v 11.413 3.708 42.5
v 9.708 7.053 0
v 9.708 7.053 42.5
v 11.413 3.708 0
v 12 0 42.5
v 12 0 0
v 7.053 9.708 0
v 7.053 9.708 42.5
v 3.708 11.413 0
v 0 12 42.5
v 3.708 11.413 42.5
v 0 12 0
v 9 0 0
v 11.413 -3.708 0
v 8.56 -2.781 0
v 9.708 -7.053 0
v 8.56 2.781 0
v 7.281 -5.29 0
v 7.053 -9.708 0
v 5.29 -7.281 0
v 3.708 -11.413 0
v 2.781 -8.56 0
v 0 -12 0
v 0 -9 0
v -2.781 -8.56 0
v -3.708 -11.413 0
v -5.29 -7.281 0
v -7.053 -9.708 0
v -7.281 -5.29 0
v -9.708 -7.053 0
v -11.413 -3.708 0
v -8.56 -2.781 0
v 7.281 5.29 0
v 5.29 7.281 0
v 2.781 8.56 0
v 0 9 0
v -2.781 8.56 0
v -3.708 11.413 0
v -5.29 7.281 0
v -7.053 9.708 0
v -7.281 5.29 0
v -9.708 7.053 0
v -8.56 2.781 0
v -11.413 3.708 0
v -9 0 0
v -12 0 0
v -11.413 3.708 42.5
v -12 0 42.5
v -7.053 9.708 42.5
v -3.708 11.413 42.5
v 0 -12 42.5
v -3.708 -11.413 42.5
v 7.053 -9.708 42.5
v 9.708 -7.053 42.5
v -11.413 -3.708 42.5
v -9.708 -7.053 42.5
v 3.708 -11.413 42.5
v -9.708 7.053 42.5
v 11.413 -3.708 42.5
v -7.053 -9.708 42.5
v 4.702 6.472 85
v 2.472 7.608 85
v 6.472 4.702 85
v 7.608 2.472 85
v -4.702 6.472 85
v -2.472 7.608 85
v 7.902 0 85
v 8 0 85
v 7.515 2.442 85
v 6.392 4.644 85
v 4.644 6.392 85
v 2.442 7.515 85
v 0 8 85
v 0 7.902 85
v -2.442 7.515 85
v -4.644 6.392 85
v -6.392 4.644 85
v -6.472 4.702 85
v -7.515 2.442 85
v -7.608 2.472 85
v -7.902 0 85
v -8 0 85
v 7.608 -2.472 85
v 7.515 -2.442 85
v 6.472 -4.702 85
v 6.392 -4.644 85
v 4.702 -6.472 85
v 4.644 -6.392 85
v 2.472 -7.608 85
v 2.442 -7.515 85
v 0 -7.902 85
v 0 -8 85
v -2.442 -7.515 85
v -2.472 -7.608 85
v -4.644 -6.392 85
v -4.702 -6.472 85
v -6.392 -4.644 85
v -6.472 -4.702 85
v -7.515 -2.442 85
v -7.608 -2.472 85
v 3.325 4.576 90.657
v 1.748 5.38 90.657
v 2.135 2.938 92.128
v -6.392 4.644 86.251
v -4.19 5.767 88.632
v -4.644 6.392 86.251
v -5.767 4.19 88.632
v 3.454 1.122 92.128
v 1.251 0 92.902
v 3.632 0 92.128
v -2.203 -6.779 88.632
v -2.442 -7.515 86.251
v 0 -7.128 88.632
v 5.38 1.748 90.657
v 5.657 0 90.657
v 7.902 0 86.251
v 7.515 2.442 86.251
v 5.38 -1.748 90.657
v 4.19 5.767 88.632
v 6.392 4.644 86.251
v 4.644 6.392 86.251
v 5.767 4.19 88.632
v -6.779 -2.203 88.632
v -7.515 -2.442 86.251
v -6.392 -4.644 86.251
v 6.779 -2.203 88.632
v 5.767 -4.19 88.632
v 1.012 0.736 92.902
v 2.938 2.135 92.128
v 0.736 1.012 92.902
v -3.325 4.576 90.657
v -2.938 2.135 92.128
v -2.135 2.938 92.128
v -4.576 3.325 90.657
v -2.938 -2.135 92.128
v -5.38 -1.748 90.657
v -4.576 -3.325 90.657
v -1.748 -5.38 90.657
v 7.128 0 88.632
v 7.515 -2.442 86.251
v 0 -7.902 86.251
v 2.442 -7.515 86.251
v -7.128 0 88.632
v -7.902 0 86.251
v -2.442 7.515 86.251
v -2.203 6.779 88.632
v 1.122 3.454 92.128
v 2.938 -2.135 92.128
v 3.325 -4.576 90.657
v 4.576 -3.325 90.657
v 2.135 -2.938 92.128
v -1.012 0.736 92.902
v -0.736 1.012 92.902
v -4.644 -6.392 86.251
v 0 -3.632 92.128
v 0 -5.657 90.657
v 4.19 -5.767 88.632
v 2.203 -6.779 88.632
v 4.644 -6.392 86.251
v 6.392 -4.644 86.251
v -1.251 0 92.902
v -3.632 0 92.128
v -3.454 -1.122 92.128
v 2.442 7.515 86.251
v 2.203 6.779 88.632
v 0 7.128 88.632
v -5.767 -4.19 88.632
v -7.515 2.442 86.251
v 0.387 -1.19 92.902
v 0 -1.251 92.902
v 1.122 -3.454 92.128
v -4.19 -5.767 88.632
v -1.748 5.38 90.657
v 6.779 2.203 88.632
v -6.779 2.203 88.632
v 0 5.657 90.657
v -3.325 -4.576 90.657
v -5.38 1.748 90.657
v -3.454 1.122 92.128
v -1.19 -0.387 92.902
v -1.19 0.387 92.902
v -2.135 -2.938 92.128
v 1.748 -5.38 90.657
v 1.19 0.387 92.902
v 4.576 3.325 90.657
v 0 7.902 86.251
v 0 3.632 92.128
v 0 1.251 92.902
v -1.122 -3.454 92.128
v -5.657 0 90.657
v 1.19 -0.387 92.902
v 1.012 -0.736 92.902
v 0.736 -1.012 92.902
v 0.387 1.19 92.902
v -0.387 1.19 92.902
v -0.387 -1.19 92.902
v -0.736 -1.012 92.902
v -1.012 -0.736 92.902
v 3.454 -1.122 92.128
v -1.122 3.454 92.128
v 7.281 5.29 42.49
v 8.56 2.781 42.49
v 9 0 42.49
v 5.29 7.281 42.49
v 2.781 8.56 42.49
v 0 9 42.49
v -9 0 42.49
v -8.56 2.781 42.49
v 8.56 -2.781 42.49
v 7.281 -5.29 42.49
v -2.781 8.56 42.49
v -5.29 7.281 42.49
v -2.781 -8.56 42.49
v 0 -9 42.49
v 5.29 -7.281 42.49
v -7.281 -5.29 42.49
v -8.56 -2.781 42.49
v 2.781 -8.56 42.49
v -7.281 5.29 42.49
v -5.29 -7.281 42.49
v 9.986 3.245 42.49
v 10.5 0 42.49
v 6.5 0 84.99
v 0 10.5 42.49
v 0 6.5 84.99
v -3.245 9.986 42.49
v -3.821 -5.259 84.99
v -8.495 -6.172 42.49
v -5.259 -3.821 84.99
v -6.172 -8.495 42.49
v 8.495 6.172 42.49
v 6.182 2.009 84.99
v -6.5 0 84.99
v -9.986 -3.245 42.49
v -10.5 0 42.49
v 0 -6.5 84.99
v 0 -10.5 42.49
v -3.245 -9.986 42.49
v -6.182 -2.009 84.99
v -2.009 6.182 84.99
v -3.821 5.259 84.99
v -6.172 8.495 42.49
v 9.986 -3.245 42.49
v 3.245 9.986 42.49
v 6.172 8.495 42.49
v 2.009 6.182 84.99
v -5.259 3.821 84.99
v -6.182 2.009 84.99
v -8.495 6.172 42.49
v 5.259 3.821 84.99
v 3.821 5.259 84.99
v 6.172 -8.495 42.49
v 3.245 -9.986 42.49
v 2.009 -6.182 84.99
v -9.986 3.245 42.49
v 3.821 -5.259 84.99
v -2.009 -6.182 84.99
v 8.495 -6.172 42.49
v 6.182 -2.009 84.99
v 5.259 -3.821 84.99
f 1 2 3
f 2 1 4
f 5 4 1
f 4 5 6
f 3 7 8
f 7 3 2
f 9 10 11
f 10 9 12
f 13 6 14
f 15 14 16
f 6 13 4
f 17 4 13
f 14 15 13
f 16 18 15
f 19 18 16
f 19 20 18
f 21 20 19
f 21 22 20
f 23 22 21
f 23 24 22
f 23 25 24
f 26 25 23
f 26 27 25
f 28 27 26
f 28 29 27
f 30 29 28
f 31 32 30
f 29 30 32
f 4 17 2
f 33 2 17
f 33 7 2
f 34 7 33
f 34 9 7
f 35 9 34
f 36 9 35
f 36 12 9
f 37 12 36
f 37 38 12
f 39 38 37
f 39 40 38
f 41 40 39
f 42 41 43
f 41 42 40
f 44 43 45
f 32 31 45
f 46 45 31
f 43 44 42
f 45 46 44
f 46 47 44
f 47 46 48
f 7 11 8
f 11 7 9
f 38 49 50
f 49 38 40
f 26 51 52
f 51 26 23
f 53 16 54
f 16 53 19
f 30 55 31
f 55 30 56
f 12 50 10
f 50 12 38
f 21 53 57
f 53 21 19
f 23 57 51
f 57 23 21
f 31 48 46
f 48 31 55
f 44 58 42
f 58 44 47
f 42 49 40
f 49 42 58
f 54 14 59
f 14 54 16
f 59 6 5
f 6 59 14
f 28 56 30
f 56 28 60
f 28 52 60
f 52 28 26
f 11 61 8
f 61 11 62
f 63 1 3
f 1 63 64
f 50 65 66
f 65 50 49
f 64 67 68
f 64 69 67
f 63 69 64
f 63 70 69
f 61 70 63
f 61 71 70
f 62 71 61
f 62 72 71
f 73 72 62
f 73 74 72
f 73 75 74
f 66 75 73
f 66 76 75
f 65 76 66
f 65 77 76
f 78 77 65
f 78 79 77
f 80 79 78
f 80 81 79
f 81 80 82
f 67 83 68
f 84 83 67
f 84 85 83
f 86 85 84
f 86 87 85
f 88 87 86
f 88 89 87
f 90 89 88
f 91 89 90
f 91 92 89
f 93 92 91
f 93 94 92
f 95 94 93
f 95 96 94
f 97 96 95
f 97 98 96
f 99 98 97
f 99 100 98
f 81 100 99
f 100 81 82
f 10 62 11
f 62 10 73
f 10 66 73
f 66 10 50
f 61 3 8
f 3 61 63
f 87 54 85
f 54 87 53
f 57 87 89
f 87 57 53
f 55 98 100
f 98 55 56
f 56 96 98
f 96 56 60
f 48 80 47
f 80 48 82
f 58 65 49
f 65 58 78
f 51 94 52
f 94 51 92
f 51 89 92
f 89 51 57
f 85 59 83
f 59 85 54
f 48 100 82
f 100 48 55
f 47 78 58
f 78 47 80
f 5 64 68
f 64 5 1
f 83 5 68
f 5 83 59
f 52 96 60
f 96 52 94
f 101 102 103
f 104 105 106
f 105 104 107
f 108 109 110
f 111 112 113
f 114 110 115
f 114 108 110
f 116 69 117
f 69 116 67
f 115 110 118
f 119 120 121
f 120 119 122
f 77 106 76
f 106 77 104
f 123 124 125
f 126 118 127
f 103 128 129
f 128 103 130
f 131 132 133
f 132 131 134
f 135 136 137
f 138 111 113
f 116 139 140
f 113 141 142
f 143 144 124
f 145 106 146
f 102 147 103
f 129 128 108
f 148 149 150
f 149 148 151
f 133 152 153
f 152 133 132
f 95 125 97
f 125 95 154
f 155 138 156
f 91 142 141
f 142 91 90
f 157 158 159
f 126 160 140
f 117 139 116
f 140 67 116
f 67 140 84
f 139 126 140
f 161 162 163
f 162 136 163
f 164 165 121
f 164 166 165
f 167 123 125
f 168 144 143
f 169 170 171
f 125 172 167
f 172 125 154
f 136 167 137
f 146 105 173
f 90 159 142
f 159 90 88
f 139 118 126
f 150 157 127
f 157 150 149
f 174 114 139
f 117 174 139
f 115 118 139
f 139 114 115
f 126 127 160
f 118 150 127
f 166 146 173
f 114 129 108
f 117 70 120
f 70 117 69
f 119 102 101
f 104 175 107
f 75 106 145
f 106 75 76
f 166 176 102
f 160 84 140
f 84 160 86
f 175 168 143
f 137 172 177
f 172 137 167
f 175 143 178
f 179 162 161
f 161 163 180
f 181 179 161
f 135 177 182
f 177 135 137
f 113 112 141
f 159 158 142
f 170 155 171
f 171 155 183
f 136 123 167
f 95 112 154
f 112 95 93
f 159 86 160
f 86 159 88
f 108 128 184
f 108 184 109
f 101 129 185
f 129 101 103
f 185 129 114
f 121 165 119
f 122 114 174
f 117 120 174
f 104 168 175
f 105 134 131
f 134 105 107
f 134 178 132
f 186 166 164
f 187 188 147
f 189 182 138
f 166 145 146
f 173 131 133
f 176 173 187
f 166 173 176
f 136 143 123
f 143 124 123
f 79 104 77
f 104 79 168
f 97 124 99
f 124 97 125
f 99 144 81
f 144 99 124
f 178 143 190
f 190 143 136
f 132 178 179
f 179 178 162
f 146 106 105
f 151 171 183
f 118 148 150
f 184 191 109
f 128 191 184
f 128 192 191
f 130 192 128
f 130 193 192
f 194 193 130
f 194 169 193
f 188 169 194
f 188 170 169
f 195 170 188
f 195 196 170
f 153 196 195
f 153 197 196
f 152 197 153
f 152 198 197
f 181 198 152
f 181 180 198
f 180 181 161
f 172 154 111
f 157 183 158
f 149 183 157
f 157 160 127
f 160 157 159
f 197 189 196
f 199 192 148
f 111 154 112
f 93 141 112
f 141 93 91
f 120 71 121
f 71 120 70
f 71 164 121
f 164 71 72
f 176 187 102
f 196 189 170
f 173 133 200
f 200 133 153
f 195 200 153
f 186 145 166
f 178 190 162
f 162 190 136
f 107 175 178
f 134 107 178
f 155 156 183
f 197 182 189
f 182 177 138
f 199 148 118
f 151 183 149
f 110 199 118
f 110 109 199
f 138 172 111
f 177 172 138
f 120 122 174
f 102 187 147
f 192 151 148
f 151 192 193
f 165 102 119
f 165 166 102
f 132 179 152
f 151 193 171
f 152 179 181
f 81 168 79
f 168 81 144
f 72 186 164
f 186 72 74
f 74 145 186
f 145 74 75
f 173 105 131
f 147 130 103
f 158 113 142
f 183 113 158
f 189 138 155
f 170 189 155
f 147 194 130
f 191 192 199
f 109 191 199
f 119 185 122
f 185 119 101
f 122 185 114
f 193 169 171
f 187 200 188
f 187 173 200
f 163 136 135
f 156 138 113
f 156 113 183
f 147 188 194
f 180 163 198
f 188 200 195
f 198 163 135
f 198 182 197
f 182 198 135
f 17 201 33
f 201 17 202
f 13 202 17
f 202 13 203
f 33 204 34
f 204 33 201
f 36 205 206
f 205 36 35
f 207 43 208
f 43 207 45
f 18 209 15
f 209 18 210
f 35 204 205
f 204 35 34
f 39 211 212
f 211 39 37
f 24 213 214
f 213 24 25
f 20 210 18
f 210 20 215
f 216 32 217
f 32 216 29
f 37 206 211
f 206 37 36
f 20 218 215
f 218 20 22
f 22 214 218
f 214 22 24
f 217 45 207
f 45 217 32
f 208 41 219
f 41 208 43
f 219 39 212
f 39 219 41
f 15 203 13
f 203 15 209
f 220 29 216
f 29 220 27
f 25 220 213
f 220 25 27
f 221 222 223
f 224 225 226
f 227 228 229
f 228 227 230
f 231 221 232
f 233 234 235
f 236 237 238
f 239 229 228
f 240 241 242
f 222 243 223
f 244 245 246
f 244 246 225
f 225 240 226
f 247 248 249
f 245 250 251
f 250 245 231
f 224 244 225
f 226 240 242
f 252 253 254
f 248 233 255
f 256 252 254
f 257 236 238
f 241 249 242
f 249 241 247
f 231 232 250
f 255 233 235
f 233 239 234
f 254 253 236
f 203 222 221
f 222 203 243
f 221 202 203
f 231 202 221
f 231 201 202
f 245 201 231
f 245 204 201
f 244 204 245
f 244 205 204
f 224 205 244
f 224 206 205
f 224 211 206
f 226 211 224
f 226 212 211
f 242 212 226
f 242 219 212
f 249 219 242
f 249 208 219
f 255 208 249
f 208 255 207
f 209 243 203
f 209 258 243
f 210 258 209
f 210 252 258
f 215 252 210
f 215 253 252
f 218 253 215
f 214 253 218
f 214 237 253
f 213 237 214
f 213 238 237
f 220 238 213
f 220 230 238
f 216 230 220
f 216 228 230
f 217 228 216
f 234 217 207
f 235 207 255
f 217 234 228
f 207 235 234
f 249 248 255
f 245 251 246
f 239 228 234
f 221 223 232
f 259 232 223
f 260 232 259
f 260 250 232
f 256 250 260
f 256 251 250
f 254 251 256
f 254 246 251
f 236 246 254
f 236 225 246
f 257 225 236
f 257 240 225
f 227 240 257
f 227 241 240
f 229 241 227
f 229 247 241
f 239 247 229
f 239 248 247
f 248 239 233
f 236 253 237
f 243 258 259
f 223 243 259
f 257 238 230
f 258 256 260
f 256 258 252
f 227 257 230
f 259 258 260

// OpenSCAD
// ***************************************************************
// * Southeastcon 2107
// *
// * Designs of the 3D printed pieces needed for Stage 2 of 
// *   the hardware robotics competition. This file contains 
// *   the lightsaber and the electromagnet coil spool.
// *
// * For more details about the competition go to
// *    http://sites.ieee.org/southeastcon2017
// *
// * Designed by Rodney Radford
// ***************************************************************


// This value controls the accuracy of the cylinders and spheres
// For fast drawing (while making changes), choose a low value (20)
// For more accurate/smoother surfaces, choose a higher value (200)
// The higher value increases computation/drawing time
$fn=20;

// ***************************************************************
// Drawing parameters
// ***************************************************************
fudge = 0.01;

hilt_length = 90;
hilt_radius = 15;
tenon_radius = 9;
tenon_length = 10;

saber_length = 85;
saber_major_radius = 12;
saber_minor_radius = 8;
saber_wall_thickness = 1.5;
inside_radius = 7;

neopixel_zoffset = 15;
neopixel_length  = 50;
neopixel_width   = 6;

bracket_thickness = 6;
screw_radius = 3;

flange_radius = 15;
flange_thickness = 2;
spool_radius = 25.4/4;
spool_width = 25;

hole_radius = 4;
inner_radius = (spool_radius + hole_radius) / 2;
clearance = 0.1;
wire_radius = 1.5;

// ***************************************************************
//
// ***************************************************************

// Look at the source for the 'draw' fun1ction to see what values can 
//   be passed in to it to control rendering parts of the model at a 
//   time for review and/or printing

//draw("innersupport");
//draw("everything");
//draw("bracket+hilt");
draw("blade");

module draw(what) {

   // Draw EVERYTHING - depending on your 3D printer, this mode is not recommended
   //    for a couple of reasons. First, it does not allow the hilt and blade to be
   //    printed in different colors (unless you pause the print and switch). Second,
   //    and most important, is the printer may try to bridge the two parts together,
   //    either intentionally or uninentionally with lots of small strands between the
   //    saber and the spool.
   // But this mode is cool to see all the parts at one time... ;-)
   if (what == "everything") {
      bracket();
      translate([0,0,bracket_thickness]) {
        lightsaber_hilt();
        translate([0,0,hilt_length]) {
           lightsaber_blade(window="true");
           lightsaber_innersupport();
        }
     }

      translate([0,hilt_radius*5,0]) {
         spool_inner();
         translate([0,0,spool_width+flange_thickness]) mirror(v=[0,0,1])
            spool_outer();
      }

   // Just render the hilt - great for 3D printing just this piece out
   // The 'official' hilt will be printed with PLA black, and then painted
   //    silver and gold colors. 
   } else if (what == "hilt") {
        lightsaber_hilt();   

   // Just render the blade - also great for 3D printing just this piece out
   // The official blade will be printed in PLA white.
   } else if (what == "blade") {
      lightsaber_blade();
  //    lightsaber_blade(cutaway="true");
  //    lightsaber_blade(window="true", cutaway="false");

   // Just the bracket
   } else if (what == "bracket") {
      bracket(cutaway="true");
   
   } else if (what == "innersupport") {
      lightsaber_innersupport();

   // bracket and hilt so it can be attached to the stage 2 wall
   } else if (what == "bracket+hilt") {
      bracket();
      translate([0,0,bracket_thickness])
        lightsaber_hilt();

   // Hilt and blade - not really useful for the contest as they need to
   //   be mounted to something, but a) cool to see it together, and b) it
   //   would be fun to see this used as the offensive weapon on the robot
   //   (is anyone up to that challenge?)
   } else if (what == "hilt+blade") {
        lightsaber_hilt();
        translate([0,0,hilt_length])
           lightsaber_blade();

   // Render it all together for visual inspection
   } else if (what == "saber") {
      bracket();
      translate([0,0,bracket_thickness]) {
        lightsaber_hilt();
        translate([0,0,hilt_length])
           lightsaber_blade(cutaway="true");
      }

   // Render just the inner spool for 3D printing (PLA, color not important)
   } else if (what == "spool_inner") {
      spool_inner();

   // Render just the outer spool for 3D printing (PLA, color not important)
   } else if (what == "spool_outer") {
      spool_outer();

   // Render both halves of the spool to verify fit
   } else if (what == "spool") {
      spool_inner();
      translate([0,0,spool_width+flange_thickness]) mirror(v=[0,0,1])
         spool_outer();
   }
}


// ***************************************************************
// 
// ***************************************************************

module lightsaber_hilt() {

difference() {

   union() {

      // major cylinder of the hilt
      color("black") cylinder(r=hilt_radius, h=hilt_length);
      translate([0,0,5])
         color("silver") cylinder(r=hilt_radius+fudge, h=55);

      // add the blade tenon on top
      color("red") translate([0,0,hilt_length])
         cylinder(r=tenon_radius, h=tenon_length);
   }

   // hollow out the center for wires
   translate([0,0,-fudge])
      cylinder(r=inside_radius, h=hilt_length+tenon_length+2*fudge);

   // remove the cylindrical grooves in the lower part of the hilt
   translate([0,0,12])
      for (i = [0:12]) {
         rotate(i*30)
         translate([0,hilt_radius-0.5,0])
         color("black") cylinder(r=3,h=40);
      }
}

// draw the three bands around the hilt
color("gold") for (z = [5,60,86]) {
 translate([0, 0, z]) 
    rotate_extrude(convexity = 10)
       translate([hilt_radius, 0, 0])
       circle(r = 3);
}

// add the square grooves at the upper part of the hilt
translate([0,0,(60+86)/2]) {
   for (i = [0:12]) {
      rotate(i*30)
      translate([0,hilt_radius,0])
        color("silver") cube([4,4,15], center=true);
      }
   }

// draw the button in the center of the upper part of the hilt
translate([0,0,(60+86)/2]) {
   rotate(a=90,v=[0,1,0]) {
      translate([0,0,inside_radius+2])
      color("silver") cylinder(r=5, h=8);
      translate([0,0,inside_radius+2+8])
      color("gold") sphere(r=4);
      }
   }
}


// ***************************************************************
// 
// ***************************************************************

module lightsaber_blade(window="false", cutaway="false") {

   color("white") difference() {
      union() {

         // straight part at the bottom half
         cylinder(r=saber_major_radius, h=saber_length/2);

         // followed by tapered top half
         translate([0,0,saber_length/2])
            cylinder(r1=saber_major_radius, r2=saber_minor_radius, h=saber_length/2);

         // then add the rounded top
         translate([0,0,saber_length]) 
            sphere(r=saber_minor_radius);   
      }

      // add straight walls to fit around the hilt tenon
      translate([0,0,-fudge]) 
         cylinder(r=tenon_radius, h=tenon_length+2*fudge);

      // hollow out the  bottom half of the saber
      translate([0,0,tenon_length]) 
         cylinder(r=tenon_radius, h=saber_length/2 - tenon_length);

      // hollow out the top half of the saber
      translate([0,0,saber_length/2 - fudge])
         cylinder(r1=saber_major_radius-saber_wall_thickness, 
                  r2=saber_minor_radius-saber_wall_thickness, 
                  h=saber_length/2);

      // the "window" option allows printing with non-clear PVA and
      //    opens up a small window in the blade so you can see the LEDs
      if (window == "true") {
          translate([0,-neopixel_width*.55,neopixel_zoffset])
             cube([saber_major_radius+fudge*2, 
                   neopixel_width*1.1, 
                   neopixel_length]);
      }  

      // the cutaway option allows seeing the interior of the blade
      if (cutaway == "true") {
         rotate(-90) translate([0,-saber_major_radius-fudge,-fudge])
            cube([saber_major_radius+  + 2*fudge, 
                  saber_major_radius*2 + 2*fudge, 
                  saber_length*1.5]);
      }
   }
}


module lightsaber_innersupport() {

   color("red") rotate(180) difference() {
      union() {
          cylinder(r=inside_radius-clearance*3, h=tenon_length);
          translate([0,0,tenon_length]) 
             cylinder(r=tenon_radius-1, h=flange_thickness);
          translate([0,-6,tenon_length+flange_thickness])
             cube([flange_thickness*2, 12, neopixel_zoffset+30]);
       }

       // carve out area to solder wires to neopixel
       translate([-fudge,-6-fudge,tenon_length+flange_thickness])
          cube([flange_thickness+fudge,12+2*fudge, 
               neopixel_zoffset+8-tenon_length-flange_thickness]);

      // carve out an area for a ziptie to hold in the vibration sensor
      translate([-fudge,-6-fudge, neopixel_zoffset+24])
         cube([flange_thickness+fudge,12+2*fudge, 4]);
      translate([-fudge,-6-fudge,neopixel_zoffset+24])
         cube([flange_thickness*2+2*fudge,2,4]);
      translate([-fudge,6+fudge-2,neopixel_zoffset+24])
         cube([flange_thickness*2+2*fudge,2,4]);

      translate([neopixel_zoffset+24,0,-10])
         cube([4,-4+fudge,20]);
 

      // carve out channel for wires
      translate([-4,-5,-fudge]) 
          cube([4, 10, tenon_length+flange_thickness+2*fudge]);

       rotate(a=-90, v=[0,1,0]) { // Z,Y,-X

          translate([tenon_length+flange_thickness,0,-10])
             cylinder(r=3, h=14);

          translate([neopixel_zoffset, 0, 0]) {
             translate([12,      2.7,-10]) cylinder(r=1.5, h=20);
             translate([12,     -2.7,-10]) cylinder(r=1.5, h=20);
             translate([12+25.4, 2.7,-10]) cylinder(r=1.5, h=20);
             translate([12+25.4,-2.7,-10]) cylinder(r=1.5, h=20);
          }
       }
   }
}


// ***************************************************************
//
// ***************************************************************

module bracket() {

   color("white") difference() {
      union() {
         // middle 'square' area of the bracket
         translate([-hilt_radius, -2*hilt_radius, 0])
            cube([hilt_radius*2, hilt_radius*4, bracket_thickness]);

         // add the rounded ends to the bracket
         translate([0, -2*hilt_radius, 0])
            cylinder(r=hilt_radius, h=screw_radius*2);
         translate([0, 2*hilt_radius, 0])
            cylinder(r=hilt_radius, h=screw_radius*2);
      }

      // drill out the two mounting holes
      translate([0,-2.2*hilt_radius, -fudge])
         cylinder(r=screw_radius, h=bracket_thickness + 2*fudge);
      translate([0,2.2*hilt_radius, -fudge])
         cylinder(r=screw_radius, h=bracket_thickness + 2*fudge);

      // drill out the inner radius (to route wires out bracket hole)
      translate([0,0,-fudge])
         cylinder(r=inside_radius, h=bracket_thickness + 2*fudge);

      translate([-hilt_radius-fudge,-0.5*bracket_thickness,-fudge])
         cube([hilt_radius+inside_radius, 
               bracket_thickness, 
               bracket_thickness * 0.8]);

     }
}


      // drill out a hole in the bracket to run the wires
//      translate([0,0,0.5*bracket_thickness]) 
//         rotate(a=-90, v=[0,1,0])
//         cylinder(r=bracket_thickness*0.4, h=hilt_radius+2*fudge);

      // remove a channel to allow wires to exit out the back of the hilt
//      translate([-hilt_radius,-0.5*bracket_thickness,-fudge])
//         cube([hilt_radius+inside_radius+2*fudge, 
//               bracket_thickness, 
//               2*bracket_thickness +2*fudge]);



// ***************************************************************
//
// ***************************************************************

module spool_inner() {

   color("blue") difference() {
      union() {

         // draw the the inner spool's flange
         cylinder(r=flange_radius, h=flange_thickness);

         // draw the spool inner cylinder
         cylinder(r=inner_radius-(clearance/2), h=spool_width);
      }

      // drill the hole through the middle of the spool
      translate([0,0,-clearance])
         cylinder(r=hole_radius, h=spool_width+3*flange_thickness);
   }
}


// ***************************************************************
//
// ***************************************************************

module spool_outer() {

   color("blue") difference() {
      union() {

         // draw the outer spool's flange
         cylinder(r=flange_radius, h=flange_thickness);

         // draw the spool outer cylinder (slips over the other half)
         cylinder(r=spool_radius, h=spool_width);
      }

      // drill the hole through the middle of the spool
      translate([0,0,-clearance])
         cylinder(r=hole_radius, h=2*clearance + flange_thickness*2);
      translate([0,0,flange_thickness-clearance])
         cylinder(r=inner_radius+(clearance/2), h=spool_width+2*clearance);

      // drill out the two holes for the wires in the side of the spool
      translate([spool_radius+wire_radius,0,-clearance])
         cylinder(r=wire_radius, h=(flange_thickness+clearance)*2); 
      translate([spool_radius+wire_radius*3.1,-clearance])
         cylinder(r=wire_radius, h=(flange_thickness+clearance)*2); 
   }
}
